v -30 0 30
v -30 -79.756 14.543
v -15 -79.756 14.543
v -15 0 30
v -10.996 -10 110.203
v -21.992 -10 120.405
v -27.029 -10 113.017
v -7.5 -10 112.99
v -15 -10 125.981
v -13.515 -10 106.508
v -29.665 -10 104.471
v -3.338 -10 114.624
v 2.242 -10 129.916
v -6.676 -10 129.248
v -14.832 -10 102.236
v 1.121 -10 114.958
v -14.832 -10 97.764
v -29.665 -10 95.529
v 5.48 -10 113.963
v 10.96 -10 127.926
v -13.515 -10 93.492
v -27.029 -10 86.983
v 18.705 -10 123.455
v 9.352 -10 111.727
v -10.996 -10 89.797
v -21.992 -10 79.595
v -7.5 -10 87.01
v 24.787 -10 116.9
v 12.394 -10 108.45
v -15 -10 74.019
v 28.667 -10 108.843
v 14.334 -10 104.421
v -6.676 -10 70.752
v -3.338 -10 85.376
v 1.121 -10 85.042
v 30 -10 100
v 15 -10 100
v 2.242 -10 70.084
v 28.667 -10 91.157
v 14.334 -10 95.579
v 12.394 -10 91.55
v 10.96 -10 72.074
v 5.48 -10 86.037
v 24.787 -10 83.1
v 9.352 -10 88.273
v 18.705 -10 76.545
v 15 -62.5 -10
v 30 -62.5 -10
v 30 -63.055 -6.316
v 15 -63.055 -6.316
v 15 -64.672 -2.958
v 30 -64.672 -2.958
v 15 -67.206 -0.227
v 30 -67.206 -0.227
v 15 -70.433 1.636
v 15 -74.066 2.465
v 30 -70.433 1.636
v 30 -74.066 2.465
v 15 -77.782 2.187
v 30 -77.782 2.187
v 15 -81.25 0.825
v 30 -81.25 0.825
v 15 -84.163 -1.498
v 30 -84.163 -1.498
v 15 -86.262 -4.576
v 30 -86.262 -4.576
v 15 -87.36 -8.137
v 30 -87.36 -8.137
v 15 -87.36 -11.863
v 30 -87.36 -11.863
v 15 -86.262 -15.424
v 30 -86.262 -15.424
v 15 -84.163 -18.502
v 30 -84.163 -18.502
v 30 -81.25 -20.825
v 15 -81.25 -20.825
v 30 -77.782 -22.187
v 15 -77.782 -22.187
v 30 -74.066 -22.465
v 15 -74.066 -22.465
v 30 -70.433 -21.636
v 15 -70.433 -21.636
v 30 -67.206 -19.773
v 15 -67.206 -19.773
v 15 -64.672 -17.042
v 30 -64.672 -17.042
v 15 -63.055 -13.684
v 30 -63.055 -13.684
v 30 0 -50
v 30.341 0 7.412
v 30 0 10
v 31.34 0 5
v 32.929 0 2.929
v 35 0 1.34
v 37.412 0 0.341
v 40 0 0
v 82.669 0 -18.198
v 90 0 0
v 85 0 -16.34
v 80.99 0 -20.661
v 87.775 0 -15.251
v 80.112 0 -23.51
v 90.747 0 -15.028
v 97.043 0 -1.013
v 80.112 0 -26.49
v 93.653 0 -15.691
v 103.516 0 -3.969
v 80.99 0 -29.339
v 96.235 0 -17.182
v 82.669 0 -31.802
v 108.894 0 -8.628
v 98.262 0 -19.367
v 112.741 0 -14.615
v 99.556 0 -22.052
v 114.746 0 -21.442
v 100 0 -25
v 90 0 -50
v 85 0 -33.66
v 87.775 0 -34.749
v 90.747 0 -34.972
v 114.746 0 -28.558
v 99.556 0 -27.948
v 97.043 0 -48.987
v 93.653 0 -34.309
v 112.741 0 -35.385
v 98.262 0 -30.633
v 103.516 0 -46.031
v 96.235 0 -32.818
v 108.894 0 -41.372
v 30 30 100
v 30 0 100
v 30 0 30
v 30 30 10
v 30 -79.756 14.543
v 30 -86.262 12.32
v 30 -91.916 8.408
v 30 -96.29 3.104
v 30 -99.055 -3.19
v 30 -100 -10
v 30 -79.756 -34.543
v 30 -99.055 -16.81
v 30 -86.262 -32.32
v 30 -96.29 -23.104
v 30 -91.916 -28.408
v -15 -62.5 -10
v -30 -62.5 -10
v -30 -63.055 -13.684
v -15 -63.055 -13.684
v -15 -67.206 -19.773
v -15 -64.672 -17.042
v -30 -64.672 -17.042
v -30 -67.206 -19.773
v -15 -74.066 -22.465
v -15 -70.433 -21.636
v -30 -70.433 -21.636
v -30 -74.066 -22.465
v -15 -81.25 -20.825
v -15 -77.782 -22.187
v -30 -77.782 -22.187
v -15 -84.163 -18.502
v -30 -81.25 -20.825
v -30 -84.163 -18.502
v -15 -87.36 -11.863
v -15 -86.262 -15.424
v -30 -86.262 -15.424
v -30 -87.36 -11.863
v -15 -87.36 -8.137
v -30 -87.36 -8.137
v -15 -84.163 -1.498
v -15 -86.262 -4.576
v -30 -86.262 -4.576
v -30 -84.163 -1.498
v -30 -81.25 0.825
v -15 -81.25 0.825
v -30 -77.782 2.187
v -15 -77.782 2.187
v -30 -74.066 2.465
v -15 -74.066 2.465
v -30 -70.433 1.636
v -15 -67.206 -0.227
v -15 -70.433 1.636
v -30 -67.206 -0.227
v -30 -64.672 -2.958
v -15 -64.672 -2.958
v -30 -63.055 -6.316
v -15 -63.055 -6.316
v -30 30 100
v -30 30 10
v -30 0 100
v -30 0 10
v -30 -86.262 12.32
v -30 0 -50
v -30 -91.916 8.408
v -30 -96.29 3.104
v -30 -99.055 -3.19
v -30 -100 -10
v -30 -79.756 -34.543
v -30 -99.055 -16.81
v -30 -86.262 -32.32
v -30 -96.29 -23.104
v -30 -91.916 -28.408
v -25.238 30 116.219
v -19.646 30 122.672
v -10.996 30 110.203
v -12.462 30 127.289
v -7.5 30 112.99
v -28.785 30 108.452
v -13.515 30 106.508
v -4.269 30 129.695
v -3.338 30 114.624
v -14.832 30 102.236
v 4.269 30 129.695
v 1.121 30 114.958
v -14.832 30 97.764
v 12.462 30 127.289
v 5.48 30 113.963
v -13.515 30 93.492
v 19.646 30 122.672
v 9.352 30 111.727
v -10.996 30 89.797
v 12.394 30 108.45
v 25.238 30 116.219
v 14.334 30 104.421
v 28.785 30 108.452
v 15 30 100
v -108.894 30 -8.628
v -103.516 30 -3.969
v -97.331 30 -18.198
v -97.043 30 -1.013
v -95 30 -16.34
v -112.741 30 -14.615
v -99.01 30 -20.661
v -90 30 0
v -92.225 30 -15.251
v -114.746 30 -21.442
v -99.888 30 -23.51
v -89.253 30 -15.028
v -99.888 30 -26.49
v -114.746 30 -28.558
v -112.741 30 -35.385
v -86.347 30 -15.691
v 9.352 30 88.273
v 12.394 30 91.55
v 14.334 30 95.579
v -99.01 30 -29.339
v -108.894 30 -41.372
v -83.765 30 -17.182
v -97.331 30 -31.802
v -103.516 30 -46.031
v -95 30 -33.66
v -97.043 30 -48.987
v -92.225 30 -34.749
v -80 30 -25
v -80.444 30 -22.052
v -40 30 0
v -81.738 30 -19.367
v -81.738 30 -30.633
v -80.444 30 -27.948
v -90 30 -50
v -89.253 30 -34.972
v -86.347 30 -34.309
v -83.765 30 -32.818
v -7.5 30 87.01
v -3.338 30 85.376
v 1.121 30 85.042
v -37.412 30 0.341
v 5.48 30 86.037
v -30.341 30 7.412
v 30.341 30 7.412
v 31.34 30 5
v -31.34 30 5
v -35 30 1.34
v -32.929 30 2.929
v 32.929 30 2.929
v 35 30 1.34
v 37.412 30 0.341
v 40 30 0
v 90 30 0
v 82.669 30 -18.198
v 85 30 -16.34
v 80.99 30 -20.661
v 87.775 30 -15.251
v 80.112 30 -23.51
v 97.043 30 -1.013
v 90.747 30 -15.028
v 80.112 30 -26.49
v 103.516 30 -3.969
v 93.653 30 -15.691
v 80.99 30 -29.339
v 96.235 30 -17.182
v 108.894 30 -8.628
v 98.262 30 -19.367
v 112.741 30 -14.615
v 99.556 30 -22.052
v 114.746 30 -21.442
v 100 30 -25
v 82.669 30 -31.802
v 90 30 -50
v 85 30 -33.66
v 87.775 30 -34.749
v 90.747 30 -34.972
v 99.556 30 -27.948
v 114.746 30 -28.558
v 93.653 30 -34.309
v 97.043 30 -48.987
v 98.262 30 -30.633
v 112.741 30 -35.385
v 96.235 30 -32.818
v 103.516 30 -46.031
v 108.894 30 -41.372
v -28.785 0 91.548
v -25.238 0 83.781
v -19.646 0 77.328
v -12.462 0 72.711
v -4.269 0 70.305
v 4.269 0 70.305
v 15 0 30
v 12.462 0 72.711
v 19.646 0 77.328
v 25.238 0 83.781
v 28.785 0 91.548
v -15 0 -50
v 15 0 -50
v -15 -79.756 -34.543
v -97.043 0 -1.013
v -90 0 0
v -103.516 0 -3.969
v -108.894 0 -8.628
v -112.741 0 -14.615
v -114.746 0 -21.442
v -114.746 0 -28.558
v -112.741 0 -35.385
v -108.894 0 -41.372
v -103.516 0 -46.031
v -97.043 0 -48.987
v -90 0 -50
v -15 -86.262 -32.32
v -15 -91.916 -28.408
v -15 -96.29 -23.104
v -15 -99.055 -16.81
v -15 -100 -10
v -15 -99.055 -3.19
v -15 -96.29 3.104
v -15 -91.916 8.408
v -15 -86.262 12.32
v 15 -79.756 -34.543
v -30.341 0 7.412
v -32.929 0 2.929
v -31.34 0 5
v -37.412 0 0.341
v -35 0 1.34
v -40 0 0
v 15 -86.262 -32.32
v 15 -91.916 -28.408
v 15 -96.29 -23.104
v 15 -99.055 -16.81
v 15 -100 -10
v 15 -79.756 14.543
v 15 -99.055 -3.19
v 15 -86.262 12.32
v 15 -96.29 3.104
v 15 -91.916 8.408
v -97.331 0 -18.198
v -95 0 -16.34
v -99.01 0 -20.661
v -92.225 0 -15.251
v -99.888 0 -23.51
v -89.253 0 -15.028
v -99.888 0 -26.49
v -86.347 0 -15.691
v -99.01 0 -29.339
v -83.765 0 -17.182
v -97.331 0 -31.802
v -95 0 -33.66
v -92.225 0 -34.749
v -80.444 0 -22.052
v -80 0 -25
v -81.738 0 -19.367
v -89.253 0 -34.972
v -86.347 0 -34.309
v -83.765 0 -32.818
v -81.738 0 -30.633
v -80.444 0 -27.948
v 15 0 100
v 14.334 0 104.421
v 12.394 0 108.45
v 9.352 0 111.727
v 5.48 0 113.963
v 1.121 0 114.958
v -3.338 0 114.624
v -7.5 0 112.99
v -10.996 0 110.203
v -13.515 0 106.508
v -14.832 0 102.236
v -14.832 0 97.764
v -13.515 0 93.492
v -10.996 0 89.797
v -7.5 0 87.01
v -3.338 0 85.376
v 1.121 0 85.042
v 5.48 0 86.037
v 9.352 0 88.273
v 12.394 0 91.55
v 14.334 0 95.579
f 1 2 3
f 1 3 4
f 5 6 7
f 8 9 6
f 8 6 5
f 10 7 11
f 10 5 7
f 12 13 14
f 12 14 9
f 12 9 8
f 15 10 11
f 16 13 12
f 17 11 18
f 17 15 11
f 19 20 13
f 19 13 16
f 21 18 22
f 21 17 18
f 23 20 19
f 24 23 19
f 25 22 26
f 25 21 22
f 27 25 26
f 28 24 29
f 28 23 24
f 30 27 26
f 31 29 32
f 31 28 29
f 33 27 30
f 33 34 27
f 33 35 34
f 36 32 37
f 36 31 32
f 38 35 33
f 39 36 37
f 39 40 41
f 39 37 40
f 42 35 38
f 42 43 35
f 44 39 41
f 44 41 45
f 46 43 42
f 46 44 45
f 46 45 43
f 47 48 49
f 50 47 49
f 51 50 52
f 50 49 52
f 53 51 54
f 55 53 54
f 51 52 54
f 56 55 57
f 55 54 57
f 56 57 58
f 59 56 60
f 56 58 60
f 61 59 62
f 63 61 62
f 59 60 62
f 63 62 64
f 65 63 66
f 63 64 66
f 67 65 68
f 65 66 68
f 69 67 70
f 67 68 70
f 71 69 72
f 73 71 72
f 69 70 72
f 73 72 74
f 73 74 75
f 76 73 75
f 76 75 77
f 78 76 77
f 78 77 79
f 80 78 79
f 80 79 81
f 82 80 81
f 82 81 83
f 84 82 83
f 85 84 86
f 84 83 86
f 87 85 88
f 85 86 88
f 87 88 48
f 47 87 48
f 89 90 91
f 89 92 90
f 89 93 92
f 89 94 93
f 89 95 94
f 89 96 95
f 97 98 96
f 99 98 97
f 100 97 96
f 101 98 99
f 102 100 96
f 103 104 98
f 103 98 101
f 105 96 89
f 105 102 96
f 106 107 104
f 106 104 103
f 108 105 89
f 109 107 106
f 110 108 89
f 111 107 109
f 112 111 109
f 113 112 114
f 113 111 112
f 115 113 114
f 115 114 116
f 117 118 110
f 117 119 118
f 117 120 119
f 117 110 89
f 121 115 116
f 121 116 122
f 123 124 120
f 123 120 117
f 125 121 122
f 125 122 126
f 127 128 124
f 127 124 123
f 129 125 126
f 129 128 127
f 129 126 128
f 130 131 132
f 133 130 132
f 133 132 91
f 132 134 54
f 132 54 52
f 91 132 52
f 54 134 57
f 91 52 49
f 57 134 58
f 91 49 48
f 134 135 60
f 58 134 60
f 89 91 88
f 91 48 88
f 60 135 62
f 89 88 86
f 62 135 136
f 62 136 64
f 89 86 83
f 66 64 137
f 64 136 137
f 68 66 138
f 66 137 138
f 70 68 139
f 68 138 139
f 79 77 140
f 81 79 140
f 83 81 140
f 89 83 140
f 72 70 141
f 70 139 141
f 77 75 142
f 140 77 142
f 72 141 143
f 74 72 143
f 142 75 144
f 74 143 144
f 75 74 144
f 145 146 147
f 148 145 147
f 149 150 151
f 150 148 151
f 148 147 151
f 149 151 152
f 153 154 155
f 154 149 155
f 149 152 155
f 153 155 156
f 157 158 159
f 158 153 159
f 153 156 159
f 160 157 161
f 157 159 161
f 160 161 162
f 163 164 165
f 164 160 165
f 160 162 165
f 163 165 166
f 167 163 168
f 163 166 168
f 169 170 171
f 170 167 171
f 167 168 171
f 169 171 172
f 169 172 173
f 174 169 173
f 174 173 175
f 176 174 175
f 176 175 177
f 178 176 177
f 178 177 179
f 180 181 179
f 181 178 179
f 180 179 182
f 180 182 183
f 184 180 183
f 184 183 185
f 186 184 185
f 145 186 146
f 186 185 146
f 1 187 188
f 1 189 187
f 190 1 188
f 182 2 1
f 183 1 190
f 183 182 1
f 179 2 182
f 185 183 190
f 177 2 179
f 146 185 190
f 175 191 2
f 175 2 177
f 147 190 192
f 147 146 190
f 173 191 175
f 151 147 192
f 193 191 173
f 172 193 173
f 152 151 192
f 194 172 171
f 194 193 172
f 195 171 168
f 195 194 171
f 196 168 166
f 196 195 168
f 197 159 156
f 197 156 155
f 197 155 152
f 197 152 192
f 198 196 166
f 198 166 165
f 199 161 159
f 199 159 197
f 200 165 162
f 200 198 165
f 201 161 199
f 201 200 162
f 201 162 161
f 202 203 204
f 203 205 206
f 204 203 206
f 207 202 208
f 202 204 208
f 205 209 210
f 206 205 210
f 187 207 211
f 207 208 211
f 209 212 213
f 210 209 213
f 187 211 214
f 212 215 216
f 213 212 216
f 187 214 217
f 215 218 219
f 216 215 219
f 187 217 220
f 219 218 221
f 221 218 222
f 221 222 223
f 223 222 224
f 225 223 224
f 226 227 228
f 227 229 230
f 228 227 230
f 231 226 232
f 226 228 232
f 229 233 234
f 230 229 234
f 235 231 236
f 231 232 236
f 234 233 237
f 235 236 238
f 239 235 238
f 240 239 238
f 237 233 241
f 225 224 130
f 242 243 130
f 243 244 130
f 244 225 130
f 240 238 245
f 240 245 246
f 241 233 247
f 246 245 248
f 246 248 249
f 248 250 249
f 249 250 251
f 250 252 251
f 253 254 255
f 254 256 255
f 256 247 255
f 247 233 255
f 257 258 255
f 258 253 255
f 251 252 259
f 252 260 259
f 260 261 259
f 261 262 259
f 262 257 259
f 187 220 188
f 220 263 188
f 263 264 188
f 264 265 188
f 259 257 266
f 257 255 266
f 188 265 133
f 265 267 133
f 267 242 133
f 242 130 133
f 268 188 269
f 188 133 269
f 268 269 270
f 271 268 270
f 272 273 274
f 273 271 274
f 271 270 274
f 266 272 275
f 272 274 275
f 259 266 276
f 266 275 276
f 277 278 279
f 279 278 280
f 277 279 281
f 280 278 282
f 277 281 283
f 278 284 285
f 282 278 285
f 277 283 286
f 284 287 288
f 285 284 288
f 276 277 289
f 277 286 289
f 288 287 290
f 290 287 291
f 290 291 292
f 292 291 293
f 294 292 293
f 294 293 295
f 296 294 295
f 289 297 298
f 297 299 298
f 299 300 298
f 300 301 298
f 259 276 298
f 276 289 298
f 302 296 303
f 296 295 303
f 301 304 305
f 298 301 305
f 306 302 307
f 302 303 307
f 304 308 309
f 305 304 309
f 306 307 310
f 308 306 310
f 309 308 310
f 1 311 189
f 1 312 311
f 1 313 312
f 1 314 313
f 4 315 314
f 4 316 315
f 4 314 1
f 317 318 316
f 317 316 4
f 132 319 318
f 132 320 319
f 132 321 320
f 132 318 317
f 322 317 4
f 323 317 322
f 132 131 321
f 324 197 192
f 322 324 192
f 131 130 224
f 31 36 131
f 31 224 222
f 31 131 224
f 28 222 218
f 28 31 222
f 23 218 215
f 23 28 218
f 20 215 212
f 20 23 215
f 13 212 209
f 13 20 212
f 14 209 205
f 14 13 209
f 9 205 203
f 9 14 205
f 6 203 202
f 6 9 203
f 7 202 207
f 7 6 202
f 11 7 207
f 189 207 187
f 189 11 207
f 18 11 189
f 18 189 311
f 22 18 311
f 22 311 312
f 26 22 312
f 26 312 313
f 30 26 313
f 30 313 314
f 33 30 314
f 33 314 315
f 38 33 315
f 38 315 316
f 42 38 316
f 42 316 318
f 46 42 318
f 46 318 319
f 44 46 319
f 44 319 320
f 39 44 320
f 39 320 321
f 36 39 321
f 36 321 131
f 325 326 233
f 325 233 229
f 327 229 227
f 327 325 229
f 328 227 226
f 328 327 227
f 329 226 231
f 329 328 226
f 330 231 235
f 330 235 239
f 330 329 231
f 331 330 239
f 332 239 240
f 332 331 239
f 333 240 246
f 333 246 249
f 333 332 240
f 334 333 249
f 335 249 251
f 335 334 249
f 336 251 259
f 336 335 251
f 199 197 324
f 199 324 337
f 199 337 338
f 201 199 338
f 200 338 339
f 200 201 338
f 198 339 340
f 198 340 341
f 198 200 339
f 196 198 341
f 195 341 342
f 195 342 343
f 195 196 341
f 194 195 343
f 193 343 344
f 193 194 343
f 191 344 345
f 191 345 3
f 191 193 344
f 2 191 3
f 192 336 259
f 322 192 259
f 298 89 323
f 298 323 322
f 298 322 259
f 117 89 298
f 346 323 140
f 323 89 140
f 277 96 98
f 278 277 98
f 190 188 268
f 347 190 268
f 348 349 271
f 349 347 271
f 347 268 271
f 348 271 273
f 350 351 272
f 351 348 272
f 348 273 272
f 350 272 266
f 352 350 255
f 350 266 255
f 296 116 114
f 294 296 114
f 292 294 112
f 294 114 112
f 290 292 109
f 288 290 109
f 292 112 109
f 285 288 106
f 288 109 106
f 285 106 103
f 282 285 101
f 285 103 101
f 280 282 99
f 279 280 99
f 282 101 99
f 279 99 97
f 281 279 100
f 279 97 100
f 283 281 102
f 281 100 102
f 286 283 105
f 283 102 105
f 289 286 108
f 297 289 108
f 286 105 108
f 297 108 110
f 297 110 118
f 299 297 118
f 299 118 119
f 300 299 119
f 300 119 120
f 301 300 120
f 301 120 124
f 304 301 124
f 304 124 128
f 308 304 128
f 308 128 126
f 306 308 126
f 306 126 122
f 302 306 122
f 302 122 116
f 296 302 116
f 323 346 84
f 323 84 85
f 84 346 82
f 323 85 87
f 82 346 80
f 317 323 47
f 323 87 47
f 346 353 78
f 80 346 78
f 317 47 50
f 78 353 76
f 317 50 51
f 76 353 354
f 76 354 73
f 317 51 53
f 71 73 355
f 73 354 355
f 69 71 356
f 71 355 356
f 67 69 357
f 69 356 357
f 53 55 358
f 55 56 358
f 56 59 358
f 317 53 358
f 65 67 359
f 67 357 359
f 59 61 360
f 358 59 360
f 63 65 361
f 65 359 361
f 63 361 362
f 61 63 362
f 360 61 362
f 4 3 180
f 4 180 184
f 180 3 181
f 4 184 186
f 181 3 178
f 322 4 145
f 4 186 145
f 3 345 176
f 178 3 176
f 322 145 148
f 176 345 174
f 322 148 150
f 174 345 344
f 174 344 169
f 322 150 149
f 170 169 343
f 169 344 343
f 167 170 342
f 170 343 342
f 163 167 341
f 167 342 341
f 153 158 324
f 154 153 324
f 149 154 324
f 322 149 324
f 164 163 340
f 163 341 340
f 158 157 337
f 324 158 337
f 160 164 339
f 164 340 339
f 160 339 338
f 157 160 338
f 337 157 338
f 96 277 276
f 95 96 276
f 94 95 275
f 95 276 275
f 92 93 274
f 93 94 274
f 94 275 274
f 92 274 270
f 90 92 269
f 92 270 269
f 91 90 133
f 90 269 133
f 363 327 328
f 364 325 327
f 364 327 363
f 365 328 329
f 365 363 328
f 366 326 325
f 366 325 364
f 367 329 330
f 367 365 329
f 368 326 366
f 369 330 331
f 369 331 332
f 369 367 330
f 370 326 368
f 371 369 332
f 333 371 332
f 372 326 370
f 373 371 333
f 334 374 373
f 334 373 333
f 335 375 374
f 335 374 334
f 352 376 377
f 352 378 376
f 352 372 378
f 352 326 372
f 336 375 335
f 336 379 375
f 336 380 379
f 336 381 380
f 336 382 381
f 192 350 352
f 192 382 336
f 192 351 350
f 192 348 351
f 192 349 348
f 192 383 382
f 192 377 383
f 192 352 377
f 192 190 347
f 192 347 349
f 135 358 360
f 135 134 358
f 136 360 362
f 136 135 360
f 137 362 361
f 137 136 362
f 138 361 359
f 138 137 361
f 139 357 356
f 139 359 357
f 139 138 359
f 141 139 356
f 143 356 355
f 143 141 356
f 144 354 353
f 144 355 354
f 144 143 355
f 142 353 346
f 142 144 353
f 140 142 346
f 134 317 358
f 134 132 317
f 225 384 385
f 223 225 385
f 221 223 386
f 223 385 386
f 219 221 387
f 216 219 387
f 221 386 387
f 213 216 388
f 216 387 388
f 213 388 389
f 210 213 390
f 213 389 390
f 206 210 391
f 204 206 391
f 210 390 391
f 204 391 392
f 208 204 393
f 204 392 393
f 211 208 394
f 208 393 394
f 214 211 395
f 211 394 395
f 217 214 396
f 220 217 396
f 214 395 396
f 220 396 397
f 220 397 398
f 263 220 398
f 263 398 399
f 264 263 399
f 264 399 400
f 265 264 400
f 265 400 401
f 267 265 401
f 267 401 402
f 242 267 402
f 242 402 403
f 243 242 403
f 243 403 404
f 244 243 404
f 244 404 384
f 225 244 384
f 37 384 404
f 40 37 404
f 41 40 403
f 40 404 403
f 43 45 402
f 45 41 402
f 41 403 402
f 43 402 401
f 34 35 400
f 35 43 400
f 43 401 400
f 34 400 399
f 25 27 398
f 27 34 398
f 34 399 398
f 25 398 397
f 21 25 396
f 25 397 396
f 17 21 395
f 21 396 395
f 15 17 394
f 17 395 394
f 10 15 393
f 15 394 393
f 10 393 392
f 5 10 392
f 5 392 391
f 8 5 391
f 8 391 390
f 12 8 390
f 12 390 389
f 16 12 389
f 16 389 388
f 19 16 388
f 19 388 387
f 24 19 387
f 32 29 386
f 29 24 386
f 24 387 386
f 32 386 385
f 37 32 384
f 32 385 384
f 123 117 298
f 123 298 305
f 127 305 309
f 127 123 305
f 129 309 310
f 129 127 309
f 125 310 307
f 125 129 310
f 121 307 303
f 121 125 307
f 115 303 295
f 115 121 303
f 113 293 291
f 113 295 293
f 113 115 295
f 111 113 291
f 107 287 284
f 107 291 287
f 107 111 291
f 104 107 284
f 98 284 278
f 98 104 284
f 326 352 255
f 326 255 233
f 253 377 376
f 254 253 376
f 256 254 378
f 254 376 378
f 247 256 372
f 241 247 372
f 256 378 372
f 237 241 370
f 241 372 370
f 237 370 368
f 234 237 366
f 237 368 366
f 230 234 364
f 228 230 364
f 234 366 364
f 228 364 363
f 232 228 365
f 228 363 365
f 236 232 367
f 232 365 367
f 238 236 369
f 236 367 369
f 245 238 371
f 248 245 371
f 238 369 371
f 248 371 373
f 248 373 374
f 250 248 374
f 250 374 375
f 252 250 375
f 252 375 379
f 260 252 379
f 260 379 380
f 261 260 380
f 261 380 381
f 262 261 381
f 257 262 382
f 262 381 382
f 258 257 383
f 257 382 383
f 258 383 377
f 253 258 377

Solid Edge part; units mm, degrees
sketch "Sketch1" plane through (0, 0, 0) normal (0, -1, 0) x (1, 0, 0)
  line L0 (-30, 0) -> (-30, 100)
  line L1 (-30, 100) -> (30, 100)
  line L2 (30, 100) -> (30, 0)
  line L3 (-30, 0) -> (30, 0)
  line L4 (-30, 0) -> (-90, 0)
  arc A0 (-90, 0) -> (-90, -50) centre (-90, -25) ccw
  line L5 (-90, -50) -> (0, -50)
  line L6 (90, -50) -> (0, -50)
  arc A1 (90, 0) -> (90, -50) centre (90, -25) cw
  line L7 (30, 0) -> (90, 0)
  line L8 (30, 0) -> (0, 0)
  line L9 (0, 0) -> (-30, 0)
  circle A2 centre (-90, -25) radius 10
  circle A3 centre (90, -25) radius 10
extrude "Protrusion1" add sketch "Sketch1" against normal blind 30
sketch "Sketch2" plane through (0, 0, 25) normal (0, -1, 0) x (1, 0, 0)
  circle A0 centre (0, 75) radius 30
extrude "ExtrudedCutout_1" cut sketch "Sketch2" against normal blind 30
sketch "Sketch3" plane through (0, 0, 25) normal (0, -1, 0) x (1, 0, 0)
  circle A0 centre (0, 75) radius 30
  circle A1 centre (0, 75) radius 15
extrude "ExtrudedProtrusion_2" add sketch "Sketch3" against normal blind 30 and the other way blind 10
fillet "Round_1" radius 10 2 edges at (30, 15, 0) (-30, 15, 0)
sketch "Sketch4" plane through (30, 0, 0) normal (1, 0, 0) x (0, 1, 0)
  line L0 (0, 30) -> (-79.7565, 14.5434)
  line L1 (0, -50) -> (0, 30)
  line L2 (0, -50) -> (-79.7565, -34.5434)
  arc A0 (-79.7565, -34.5433) -> (-79.7565, 14.5433) centre (-75, -10) cw
  circle A1 centre (-75, -10) radius 12.5
extrude "ExtrudedProtrusion_3" add sketch "Sketch4" against normal blind 15
mirror "Mirror1" about plane through (0, 0, 0) normal (1, 0, 0) of "ExtrudedProtrusion_3"
